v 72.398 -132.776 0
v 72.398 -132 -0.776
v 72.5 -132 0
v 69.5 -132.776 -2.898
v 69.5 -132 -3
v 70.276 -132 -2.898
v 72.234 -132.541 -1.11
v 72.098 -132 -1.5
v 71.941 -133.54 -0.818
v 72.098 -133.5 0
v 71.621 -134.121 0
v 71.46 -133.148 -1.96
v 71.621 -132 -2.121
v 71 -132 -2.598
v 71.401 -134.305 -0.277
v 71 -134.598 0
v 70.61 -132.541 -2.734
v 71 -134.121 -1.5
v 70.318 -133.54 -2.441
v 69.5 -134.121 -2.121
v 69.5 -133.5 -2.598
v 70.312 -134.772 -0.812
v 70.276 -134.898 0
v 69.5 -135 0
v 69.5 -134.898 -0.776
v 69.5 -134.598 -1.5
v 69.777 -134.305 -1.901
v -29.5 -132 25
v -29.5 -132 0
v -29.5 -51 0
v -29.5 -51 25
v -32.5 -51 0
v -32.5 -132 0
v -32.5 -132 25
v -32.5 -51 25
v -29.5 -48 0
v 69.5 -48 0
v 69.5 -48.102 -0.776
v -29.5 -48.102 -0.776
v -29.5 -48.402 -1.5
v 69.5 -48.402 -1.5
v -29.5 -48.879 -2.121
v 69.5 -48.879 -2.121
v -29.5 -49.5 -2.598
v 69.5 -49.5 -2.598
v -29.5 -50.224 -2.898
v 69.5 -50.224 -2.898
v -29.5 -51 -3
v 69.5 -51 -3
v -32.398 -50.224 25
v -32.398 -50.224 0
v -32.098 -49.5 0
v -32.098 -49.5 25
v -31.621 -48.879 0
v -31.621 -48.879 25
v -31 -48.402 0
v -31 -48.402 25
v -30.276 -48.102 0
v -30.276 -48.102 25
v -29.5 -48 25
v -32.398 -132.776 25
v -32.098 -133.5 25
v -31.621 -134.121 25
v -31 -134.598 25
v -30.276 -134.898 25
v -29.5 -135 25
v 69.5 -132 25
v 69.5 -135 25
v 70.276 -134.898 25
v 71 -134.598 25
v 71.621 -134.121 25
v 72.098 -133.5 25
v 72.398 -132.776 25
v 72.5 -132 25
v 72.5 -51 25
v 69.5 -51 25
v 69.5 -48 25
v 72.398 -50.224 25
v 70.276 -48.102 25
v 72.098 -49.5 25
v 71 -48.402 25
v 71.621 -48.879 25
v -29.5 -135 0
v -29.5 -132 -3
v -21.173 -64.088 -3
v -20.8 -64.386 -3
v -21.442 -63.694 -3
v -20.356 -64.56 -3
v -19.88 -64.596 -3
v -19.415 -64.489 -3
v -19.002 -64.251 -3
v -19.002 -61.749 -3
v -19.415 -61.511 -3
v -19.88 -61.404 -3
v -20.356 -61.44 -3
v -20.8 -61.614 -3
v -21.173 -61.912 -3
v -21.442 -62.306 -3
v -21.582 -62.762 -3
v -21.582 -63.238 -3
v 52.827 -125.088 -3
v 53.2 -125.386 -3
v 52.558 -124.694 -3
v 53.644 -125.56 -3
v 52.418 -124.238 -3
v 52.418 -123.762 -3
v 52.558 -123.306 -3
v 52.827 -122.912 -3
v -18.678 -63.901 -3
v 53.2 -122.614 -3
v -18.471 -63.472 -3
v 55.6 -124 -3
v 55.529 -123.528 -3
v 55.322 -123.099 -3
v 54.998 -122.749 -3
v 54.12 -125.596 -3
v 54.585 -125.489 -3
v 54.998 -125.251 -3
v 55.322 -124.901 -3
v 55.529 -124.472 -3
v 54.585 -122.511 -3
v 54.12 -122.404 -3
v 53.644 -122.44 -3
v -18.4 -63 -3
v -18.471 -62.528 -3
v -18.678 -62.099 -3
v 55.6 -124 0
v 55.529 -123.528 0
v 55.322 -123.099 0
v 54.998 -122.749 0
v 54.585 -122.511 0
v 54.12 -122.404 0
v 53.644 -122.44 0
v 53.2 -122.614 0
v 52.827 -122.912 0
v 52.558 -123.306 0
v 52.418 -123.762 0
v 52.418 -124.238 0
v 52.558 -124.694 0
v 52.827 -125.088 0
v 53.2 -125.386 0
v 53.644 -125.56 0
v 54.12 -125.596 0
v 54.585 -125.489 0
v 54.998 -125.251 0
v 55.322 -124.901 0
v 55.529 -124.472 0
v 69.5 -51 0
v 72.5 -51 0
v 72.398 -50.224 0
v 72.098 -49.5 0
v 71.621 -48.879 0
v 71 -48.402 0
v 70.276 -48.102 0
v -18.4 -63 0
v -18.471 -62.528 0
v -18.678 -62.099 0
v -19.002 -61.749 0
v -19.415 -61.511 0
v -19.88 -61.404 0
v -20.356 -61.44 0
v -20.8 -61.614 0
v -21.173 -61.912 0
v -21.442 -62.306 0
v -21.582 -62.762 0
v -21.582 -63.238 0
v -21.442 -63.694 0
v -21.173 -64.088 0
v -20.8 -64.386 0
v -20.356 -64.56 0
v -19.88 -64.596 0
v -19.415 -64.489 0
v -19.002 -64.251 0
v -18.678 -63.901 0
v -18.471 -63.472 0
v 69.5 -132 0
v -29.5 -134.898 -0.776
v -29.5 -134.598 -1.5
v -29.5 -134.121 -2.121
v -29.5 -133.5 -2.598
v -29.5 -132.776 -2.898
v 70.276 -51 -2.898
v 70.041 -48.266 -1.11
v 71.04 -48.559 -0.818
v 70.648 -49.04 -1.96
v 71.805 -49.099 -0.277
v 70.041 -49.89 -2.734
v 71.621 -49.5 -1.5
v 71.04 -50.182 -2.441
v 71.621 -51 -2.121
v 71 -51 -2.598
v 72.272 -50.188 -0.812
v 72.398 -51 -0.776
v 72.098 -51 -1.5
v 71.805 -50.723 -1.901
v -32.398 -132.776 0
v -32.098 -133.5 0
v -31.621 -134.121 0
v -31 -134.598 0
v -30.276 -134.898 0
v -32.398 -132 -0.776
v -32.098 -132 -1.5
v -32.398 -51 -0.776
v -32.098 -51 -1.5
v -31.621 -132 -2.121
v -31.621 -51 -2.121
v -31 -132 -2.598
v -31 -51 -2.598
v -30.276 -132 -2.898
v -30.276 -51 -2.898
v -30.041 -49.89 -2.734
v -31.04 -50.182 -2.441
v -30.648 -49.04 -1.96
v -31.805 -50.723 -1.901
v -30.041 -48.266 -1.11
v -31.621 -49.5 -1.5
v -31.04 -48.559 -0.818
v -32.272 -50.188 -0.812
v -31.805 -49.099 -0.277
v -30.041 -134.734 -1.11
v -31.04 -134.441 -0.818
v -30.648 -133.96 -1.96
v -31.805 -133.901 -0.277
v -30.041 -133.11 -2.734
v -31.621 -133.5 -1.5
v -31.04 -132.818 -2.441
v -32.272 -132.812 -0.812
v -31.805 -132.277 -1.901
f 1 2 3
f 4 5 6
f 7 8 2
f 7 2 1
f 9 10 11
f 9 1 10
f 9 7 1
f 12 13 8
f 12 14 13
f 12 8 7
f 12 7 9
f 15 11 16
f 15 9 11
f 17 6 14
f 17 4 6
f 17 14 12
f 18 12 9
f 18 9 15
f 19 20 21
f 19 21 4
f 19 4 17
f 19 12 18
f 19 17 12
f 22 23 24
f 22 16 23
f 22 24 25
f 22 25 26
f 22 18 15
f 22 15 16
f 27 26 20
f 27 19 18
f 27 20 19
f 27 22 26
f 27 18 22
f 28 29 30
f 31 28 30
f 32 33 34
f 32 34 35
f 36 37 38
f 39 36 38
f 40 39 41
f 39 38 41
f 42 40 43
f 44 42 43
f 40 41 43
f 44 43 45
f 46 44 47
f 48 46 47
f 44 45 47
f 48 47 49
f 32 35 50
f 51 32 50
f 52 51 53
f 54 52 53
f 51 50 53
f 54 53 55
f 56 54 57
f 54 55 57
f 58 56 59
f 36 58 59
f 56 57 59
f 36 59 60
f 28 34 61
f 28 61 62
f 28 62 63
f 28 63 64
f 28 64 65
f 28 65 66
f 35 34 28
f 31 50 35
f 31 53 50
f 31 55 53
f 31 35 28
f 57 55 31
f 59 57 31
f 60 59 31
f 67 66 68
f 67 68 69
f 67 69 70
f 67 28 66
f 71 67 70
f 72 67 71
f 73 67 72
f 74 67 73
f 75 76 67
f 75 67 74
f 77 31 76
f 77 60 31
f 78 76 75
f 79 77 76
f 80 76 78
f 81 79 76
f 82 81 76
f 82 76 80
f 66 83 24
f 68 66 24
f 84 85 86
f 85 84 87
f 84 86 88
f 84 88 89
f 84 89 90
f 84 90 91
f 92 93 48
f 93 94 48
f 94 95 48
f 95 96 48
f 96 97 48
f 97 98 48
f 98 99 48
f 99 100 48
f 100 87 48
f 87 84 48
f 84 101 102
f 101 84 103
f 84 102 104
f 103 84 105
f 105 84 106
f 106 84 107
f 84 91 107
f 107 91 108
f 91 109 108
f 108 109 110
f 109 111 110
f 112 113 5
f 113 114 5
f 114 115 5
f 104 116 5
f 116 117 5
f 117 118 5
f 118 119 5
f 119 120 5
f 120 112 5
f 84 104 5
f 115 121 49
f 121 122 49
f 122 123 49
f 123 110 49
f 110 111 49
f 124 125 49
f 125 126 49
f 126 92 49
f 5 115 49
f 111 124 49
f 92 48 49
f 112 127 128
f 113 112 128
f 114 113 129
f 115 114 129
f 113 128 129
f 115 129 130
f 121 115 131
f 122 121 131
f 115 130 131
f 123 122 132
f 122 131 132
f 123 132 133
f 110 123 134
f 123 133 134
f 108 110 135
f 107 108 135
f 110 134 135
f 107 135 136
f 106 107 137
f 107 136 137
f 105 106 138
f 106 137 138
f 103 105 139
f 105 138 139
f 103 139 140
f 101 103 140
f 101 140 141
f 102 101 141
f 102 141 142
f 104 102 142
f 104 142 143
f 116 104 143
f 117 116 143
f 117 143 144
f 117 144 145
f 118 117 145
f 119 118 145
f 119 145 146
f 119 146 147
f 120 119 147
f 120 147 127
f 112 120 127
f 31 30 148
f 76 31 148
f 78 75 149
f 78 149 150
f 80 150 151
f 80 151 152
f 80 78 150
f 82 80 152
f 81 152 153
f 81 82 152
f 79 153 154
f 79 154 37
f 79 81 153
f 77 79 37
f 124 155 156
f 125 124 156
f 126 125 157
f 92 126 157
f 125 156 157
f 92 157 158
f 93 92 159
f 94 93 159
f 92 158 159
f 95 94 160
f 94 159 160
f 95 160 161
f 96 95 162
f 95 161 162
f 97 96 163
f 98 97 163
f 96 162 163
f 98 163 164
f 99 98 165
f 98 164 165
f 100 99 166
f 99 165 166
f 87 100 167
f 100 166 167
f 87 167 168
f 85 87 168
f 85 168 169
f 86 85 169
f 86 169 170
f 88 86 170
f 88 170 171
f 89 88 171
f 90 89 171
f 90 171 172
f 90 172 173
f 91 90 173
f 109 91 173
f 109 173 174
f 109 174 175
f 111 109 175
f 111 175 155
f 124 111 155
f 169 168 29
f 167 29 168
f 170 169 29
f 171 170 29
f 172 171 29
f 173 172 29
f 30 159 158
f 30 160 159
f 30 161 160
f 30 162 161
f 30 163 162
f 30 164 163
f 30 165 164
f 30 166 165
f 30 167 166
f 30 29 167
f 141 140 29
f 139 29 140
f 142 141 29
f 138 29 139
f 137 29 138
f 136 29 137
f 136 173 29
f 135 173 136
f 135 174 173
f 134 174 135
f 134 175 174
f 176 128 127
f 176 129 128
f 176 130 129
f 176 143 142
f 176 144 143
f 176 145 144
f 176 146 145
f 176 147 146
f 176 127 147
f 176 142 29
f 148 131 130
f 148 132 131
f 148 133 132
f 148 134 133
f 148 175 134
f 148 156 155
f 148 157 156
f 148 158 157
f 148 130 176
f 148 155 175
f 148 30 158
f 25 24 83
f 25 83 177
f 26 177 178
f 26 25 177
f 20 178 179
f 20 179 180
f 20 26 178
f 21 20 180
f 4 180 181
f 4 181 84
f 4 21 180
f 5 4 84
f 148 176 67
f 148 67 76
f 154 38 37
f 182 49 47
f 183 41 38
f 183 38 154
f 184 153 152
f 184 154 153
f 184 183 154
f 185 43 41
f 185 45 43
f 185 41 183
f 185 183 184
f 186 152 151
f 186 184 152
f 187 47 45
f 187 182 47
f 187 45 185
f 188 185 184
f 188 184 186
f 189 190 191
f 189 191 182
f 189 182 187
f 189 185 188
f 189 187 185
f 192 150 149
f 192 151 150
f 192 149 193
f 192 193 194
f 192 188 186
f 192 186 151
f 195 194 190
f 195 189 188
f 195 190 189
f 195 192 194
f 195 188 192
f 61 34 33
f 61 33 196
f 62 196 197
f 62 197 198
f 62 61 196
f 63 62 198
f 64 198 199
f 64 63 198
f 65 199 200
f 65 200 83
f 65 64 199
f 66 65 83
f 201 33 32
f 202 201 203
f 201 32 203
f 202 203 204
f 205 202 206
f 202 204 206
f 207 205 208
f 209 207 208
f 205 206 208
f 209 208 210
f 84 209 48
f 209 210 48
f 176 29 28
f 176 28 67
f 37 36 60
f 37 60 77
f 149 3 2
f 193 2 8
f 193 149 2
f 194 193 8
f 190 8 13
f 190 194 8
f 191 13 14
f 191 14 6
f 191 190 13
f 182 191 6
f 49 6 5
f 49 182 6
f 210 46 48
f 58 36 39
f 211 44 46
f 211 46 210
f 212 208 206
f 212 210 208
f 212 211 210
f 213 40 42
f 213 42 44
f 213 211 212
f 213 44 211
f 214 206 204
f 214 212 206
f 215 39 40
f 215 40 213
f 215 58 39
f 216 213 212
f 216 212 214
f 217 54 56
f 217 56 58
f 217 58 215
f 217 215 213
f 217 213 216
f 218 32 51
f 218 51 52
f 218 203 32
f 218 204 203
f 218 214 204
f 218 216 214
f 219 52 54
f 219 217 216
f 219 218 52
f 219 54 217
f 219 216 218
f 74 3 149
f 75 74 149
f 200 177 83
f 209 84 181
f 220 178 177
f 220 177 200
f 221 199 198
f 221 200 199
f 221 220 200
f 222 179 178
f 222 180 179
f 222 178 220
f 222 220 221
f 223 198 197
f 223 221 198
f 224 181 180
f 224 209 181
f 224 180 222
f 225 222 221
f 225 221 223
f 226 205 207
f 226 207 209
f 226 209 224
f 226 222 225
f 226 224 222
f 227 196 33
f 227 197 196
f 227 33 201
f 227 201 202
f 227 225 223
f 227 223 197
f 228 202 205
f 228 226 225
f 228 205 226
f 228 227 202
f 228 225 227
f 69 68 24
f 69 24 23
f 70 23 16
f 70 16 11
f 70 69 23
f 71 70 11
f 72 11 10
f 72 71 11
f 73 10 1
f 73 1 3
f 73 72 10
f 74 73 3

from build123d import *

# Parameters (mm, degrees)
SKETCH_W     = 99
SKETCH_H     = 81
PAD_DEPTH    = 25
THICKNESS_T  = 3
SKETCH004_R  = 1.6
POCKET_DEPTH = 40.001


with BuildPart() as part:
    # Sketch → Pad (new body)
    with BuildSketch(Plane.XY):
        with Locations((20, -91.5)):
            Rectangle(SKETCH_W, SKETCH_H)
    extrude(amount=PAD_DEPTH)

    # Thickness
    thickness_openings = [part.faces().sort_by_distance(p)[0] for p in [
        (20, -91.5, 25),
    ]]
    offset(amount=THICKNESS_T, openings=thickness_openings)

    # Sketch004 (on Part__Feature) → Pocket (cut, through all)
    with BuildSketch(Plane(origin=(-200, 0, 37), x_dir=(1, 0, 0), z_dir=(0, 0, 1))):
        with Locations((180, -63)):
            Circle(SKETCH004_R)
        with Locations((254, -124)):
            Circle(SKETCH004_R)
    extrude(amount=-POCKET_DEPTH, mode=Mode.SUBTRACT)


solid = part.part
